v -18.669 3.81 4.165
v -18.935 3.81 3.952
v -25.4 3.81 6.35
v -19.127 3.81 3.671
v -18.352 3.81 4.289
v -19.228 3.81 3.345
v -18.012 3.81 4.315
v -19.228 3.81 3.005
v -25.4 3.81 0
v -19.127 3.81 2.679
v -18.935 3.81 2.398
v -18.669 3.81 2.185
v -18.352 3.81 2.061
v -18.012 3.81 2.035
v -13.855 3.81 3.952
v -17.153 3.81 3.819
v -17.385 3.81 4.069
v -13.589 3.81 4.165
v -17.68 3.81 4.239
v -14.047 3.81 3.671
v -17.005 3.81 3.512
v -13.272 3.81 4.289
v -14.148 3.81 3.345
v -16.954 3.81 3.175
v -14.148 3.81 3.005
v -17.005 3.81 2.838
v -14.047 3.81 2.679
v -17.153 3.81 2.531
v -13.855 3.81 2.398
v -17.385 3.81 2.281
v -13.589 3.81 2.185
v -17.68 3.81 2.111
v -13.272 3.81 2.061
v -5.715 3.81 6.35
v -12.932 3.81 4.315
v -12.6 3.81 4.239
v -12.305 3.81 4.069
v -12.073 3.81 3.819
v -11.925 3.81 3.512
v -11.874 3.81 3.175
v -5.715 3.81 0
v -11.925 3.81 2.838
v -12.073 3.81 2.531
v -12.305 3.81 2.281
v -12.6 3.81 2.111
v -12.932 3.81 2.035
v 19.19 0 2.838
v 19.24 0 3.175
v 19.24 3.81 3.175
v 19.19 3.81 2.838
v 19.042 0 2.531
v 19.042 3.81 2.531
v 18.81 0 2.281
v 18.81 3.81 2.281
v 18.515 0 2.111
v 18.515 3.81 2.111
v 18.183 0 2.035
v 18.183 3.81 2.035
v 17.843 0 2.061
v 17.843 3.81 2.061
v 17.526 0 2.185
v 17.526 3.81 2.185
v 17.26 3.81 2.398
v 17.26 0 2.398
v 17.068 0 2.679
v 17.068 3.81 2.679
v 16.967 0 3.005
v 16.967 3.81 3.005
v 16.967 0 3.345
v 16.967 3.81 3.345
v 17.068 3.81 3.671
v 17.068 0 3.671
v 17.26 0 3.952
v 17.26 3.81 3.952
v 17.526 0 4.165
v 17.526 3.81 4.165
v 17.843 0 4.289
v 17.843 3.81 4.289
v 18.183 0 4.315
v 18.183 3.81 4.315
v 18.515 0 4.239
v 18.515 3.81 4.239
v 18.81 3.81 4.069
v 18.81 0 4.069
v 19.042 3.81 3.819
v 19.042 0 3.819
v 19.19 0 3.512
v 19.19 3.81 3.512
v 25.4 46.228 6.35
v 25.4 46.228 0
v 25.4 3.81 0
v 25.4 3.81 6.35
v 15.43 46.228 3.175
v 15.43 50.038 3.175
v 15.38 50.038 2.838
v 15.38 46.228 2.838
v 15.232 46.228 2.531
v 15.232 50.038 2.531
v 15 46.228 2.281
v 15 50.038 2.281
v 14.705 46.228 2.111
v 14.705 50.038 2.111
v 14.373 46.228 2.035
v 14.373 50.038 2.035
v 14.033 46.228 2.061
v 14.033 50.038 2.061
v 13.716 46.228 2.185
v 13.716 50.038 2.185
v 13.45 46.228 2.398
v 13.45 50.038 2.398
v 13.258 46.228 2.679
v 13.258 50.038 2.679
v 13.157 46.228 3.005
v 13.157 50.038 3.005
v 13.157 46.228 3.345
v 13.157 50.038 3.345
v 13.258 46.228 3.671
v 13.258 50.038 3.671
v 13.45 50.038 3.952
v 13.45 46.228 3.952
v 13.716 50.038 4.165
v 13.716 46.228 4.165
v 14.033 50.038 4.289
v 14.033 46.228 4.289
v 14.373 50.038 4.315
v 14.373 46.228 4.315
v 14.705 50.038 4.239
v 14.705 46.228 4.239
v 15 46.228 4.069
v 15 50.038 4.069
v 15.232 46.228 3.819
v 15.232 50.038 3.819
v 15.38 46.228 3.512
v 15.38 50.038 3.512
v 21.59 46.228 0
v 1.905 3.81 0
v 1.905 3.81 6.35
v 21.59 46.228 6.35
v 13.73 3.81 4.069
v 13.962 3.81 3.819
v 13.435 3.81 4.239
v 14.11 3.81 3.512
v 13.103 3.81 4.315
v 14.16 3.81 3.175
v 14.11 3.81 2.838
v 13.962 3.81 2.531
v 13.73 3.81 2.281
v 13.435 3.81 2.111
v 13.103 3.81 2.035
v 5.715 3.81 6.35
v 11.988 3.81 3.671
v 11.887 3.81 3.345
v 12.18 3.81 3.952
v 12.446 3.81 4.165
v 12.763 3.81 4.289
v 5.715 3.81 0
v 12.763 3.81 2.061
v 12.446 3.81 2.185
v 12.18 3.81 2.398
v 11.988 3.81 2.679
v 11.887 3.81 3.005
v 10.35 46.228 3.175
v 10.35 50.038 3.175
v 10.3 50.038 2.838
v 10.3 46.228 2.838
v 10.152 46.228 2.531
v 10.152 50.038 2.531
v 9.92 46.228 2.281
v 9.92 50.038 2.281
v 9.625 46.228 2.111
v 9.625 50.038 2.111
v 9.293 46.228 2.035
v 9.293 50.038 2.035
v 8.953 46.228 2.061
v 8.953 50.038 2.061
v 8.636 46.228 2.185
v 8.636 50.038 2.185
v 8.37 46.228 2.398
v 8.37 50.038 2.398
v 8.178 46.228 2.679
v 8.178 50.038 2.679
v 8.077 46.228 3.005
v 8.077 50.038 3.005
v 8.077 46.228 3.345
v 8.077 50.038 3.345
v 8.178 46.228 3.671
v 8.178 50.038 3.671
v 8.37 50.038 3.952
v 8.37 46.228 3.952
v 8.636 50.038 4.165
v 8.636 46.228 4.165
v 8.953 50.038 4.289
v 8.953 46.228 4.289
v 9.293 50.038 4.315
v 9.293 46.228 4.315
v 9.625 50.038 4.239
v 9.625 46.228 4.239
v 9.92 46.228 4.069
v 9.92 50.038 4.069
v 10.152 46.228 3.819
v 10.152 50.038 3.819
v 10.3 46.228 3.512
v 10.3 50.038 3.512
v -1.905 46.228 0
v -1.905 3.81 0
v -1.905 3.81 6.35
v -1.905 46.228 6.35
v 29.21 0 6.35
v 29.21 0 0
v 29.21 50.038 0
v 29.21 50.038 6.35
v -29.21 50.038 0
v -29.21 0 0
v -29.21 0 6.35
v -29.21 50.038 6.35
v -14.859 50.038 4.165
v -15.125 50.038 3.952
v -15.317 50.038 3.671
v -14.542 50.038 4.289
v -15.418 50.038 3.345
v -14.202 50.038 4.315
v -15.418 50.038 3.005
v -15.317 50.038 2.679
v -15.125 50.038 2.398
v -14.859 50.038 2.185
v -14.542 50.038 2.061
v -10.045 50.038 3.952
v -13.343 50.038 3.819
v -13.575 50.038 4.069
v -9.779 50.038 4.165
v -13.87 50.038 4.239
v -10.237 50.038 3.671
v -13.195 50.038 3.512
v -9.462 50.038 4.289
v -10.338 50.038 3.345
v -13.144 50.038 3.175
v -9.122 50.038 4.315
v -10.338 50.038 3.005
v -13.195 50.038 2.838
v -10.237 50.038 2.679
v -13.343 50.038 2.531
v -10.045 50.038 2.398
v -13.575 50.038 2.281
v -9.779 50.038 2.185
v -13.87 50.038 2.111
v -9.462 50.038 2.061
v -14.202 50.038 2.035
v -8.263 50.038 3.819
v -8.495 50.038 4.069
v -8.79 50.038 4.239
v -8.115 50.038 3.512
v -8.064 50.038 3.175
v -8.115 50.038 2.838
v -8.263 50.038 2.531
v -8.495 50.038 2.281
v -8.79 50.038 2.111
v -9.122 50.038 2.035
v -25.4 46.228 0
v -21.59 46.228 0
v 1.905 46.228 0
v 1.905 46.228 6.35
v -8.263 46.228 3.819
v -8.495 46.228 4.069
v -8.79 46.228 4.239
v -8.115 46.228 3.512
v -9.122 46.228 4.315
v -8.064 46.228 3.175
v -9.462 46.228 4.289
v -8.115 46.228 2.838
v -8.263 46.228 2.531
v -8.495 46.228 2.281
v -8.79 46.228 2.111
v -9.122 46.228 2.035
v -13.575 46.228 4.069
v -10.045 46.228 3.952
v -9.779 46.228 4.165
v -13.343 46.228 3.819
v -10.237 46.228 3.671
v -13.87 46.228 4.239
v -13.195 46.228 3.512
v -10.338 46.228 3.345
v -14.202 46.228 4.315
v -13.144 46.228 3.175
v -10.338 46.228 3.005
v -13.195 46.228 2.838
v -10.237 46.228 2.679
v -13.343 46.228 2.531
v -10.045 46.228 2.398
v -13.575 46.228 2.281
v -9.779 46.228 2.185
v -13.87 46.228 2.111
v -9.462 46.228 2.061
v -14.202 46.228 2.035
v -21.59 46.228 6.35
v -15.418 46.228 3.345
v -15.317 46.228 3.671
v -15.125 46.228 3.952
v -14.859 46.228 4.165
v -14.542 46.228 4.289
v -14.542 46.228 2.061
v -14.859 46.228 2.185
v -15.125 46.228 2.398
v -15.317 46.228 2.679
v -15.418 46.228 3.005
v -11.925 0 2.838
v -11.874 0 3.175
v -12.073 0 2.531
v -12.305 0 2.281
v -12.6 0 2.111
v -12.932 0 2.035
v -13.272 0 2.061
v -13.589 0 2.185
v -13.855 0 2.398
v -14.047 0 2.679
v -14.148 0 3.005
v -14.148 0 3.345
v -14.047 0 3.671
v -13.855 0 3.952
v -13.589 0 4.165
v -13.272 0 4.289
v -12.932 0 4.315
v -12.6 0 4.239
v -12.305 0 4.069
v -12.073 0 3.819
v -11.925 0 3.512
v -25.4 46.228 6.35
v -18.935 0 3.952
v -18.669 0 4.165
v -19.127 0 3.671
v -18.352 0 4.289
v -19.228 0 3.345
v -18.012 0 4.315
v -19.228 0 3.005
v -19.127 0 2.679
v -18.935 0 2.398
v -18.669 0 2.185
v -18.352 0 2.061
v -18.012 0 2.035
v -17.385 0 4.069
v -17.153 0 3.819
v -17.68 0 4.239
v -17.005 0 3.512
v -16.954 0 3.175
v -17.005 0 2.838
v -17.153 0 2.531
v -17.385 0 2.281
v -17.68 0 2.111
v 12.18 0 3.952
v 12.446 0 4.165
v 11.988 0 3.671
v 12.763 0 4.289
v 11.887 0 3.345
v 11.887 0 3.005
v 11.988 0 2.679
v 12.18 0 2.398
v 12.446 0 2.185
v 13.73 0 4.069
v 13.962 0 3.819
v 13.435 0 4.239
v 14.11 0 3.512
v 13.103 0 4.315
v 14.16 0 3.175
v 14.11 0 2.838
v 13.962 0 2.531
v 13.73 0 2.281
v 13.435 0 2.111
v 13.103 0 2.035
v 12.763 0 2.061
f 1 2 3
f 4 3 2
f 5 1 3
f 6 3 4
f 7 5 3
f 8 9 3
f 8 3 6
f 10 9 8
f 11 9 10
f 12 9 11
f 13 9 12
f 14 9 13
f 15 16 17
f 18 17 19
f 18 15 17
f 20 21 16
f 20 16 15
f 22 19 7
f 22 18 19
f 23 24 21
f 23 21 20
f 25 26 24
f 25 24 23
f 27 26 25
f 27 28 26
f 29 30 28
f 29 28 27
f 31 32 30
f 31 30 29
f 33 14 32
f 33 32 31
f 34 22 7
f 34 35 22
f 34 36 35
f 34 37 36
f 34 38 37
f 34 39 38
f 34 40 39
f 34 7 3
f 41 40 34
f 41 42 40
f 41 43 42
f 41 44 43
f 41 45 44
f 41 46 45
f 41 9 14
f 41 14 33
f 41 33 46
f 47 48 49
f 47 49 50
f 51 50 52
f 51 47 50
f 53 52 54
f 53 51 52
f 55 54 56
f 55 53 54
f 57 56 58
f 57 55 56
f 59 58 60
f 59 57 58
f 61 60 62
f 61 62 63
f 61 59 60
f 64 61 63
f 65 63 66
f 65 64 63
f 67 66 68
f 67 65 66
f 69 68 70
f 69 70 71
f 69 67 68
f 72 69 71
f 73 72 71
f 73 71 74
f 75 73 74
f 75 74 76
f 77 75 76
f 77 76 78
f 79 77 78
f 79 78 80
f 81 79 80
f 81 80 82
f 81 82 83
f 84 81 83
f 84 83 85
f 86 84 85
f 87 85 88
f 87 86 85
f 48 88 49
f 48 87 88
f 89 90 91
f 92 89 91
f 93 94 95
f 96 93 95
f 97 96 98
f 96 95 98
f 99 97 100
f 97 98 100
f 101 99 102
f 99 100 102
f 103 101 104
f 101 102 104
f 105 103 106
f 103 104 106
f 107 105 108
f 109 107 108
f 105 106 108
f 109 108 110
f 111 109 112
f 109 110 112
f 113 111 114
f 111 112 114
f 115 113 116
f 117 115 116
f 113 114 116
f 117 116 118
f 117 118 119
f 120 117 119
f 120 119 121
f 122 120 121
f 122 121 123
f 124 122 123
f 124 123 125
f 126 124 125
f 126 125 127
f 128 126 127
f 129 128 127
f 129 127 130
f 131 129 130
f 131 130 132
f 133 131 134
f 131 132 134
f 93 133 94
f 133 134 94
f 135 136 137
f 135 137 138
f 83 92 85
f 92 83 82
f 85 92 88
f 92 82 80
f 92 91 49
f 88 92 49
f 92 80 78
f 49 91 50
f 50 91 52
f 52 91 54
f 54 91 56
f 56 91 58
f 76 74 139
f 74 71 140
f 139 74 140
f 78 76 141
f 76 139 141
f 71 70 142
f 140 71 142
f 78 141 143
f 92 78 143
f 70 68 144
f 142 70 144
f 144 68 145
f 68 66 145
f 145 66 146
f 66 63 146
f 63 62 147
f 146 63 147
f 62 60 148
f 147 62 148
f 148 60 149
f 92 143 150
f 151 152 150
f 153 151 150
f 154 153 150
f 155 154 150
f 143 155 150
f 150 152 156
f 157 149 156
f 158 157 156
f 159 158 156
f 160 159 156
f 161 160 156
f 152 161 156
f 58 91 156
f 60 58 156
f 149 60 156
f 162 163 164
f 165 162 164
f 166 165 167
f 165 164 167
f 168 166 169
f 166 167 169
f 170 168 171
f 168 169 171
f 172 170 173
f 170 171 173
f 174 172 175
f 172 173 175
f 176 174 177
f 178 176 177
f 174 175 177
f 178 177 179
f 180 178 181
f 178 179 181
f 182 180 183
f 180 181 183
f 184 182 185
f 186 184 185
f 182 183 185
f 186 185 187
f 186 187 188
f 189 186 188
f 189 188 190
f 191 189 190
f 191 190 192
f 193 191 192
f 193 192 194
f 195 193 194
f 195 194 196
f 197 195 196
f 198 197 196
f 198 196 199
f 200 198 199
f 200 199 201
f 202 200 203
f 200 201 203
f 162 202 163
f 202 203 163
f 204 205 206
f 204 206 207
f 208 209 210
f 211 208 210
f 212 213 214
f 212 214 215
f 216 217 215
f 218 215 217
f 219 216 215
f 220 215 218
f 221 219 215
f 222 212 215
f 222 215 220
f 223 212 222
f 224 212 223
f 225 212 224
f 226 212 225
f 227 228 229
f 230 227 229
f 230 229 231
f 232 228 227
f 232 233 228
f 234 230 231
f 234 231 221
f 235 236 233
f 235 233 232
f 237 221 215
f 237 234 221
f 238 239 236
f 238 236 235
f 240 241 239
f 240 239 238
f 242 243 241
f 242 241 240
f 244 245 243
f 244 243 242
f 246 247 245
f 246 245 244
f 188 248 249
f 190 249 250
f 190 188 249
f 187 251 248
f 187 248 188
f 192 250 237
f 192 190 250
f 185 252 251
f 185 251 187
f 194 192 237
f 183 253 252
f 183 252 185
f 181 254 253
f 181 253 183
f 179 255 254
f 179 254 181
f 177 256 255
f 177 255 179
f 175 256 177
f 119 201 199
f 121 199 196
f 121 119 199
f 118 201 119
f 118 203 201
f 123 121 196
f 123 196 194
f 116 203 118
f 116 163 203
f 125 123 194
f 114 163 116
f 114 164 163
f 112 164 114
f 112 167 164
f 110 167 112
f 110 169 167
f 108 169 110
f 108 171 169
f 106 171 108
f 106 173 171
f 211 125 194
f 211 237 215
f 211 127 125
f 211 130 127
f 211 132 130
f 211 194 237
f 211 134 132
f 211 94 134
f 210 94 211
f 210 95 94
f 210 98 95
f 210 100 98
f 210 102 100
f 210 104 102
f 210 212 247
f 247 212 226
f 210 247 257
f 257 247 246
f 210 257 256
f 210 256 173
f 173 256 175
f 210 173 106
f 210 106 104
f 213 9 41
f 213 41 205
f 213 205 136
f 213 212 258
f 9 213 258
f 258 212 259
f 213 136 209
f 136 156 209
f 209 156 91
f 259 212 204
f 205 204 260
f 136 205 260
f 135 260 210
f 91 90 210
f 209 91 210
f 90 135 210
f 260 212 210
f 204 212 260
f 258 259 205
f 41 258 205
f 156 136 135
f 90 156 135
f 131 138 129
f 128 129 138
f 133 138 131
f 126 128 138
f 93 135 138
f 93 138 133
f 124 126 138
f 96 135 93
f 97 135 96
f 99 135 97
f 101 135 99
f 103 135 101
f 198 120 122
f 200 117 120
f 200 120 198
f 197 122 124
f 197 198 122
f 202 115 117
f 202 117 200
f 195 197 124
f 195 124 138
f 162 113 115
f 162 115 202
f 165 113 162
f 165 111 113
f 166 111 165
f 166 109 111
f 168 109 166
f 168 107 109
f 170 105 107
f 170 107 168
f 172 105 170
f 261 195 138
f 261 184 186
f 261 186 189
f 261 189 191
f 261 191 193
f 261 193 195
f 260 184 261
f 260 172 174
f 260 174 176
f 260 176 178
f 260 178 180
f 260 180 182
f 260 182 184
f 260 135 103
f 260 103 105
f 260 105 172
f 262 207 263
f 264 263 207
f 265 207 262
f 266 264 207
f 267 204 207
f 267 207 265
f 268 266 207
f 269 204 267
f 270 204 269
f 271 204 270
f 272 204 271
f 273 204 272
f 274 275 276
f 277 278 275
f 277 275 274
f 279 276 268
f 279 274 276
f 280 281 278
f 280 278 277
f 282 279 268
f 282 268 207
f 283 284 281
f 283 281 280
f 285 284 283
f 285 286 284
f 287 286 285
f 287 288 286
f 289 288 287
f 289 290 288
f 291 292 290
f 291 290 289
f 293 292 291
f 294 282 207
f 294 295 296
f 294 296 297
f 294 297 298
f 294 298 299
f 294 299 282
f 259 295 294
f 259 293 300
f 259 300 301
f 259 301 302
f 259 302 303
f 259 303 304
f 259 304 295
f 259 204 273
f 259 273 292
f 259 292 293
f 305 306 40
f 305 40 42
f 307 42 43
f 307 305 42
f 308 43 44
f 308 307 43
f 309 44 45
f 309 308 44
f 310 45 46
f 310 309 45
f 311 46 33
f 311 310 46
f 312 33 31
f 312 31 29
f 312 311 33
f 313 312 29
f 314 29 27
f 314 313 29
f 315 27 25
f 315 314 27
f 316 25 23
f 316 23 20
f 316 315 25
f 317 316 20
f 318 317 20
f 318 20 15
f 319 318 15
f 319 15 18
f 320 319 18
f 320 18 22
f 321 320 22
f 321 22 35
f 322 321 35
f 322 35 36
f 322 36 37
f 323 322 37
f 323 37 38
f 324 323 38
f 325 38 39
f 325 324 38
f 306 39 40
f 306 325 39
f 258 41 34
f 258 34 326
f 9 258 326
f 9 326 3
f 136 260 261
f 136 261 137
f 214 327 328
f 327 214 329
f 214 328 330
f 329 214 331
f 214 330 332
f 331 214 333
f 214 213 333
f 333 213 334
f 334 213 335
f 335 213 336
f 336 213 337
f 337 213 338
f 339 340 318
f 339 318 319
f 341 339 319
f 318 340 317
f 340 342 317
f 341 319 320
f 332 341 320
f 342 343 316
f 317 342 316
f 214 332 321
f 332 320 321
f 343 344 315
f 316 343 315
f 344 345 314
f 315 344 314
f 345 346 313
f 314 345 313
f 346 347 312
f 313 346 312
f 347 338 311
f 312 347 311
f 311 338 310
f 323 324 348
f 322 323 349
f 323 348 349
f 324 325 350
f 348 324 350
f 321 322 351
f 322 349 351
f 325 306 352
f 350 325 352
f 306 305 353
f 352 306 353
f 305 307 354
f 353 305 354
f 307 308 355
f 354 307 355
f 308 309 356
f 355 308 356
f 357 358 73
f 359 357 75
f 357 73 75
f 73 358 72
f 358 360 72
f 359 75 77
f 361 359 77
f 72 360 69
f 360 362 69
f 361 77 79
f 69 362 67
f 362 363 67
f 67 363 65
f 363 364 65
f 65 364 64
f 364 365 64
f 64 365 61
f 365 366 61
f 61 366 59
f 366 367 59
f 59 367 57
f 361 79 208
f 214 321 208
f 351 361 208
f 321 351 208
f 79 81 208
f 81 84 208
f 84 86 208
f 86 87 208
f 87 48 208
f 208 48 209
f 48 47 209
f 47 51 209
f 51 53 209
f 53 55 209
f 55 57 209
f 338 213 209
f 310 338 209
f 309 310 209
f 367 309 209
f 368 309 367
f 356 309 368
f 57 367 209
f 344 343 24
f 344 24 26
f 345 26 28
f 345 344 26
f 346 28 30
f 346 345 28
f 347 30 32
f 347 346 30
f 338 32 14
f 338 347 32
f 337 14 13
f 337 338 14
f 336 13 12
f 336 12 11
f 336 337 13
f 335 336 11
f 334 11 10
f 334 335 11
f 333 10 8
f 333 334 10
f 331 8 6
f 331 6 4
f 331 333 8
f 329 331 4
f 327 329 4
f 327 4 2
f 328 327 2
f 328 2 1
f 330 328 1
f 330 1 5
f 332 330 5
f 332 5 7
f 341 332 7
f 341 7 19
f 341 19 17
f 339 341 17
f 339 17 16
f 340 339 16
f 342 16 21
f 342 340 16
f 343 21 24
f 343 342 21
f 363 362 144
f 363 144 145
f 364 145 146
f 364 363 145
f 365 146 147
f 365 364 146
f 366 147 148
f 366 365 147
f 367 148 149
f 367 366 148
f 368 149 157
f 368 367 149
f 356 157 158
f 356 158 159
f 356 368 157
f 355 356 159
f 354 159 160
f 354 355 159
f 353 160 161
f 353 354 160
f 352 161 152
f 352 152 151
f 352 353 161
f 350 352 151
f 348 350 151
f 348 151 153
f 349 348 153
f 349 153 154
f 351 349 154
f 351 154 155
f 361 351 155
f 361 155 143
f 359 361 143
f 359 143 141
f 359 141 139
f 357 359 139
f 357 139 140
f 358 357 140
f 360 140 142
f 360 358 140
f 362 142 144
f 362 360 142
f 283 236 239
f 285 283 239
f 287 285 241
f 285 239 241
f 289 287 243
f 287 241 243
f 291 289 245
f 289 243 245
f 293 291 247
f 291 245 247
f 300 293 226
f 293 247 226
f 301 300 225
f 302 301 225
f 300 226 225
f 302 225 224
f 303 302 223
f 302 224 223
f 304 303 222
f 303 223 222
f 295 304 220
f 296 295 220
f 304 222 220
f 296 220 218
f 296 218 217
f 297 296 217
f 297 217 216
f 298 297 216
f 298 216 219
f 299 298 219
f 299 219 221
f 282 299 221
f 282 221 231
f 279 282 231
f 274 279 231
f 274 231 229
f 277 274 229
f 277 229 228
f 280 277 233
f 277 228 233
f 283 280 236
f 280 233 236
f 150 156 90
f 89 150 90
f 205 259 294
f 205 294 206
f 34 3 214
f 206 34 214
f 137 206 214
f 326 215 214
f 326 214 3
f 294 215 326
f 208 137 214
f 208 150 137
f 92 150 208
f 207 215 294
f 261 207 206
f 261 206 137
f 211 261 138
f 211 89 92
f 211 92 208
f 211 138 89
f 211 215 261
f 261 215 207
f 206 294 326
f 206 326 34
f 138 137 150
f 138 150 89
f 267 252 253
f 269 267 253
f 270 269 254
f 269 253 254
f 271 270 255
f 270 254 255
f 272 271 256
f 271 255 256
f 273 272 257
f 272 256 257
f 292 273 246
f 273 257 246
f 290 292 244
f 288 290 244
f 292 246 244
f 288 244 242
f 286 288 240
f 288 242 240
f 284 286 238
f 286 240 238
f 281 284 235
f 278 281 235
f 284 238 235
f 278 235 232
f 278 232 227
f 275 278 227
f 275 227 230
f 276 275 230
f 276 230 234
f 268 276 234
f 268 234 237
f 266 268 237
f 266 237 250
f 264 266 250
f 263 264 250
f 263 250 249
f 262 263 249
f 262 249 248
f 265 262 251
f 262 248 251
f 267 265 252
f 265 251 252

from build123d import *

# Parameters (mm, degrees)
SKETCH1_W           = 58.42
SKETCH1_H           = 50.038
BOSS_EXTRUDE1_DEPTH = 6.35
SKETCH2_R           = 1.143
CUT_EXTRUDE1_DEPTH  = 3.81
SKETCH3_R           = 1.143
CUT_EXTRUDE2_DEPTH  = 3.81


with BuildPart() as part:
    # Sketch1 → Boss-Extrude1 (new body)
    with BuildSketch(Plane.XY):
        with Locations((0, 25.019)):
            Rectangle(SKETCH1_W, SKETCH1_H)
        Polygon((-25.4, 46.228), (-25.4, 3.81), (-5.715, 3.81), align=None, mode=Mode.SUBTRACT)
        Polygon((1.905, 46.228), (1.905, 3.81), (21.59, 46.228), align=None, mode=Mode.SUBTRACT)
        Polygon((-21.59, 46.228), (-1.905, 3.81), (-1.905, 46.228), align=None, mode=Mode.SUBTRACT)
        Polygon((5.715, 3.81), (25.4, 46.228), (25.4, 3.81), align=None, mode=Mode.SUBTRACT)
    extrude(amount=BOSS_EXTRUDE1_DEPTH)

    # Sketch2 → Cut-Extrude1 (cut)
    with BuildSketch(Plane(origin=(0, 0, 0), x_dir=(1, 0, 0), z_dir=(0, 1, 0))):
        with Locations((-18.0975, -3.175)):
            Circle(SKETCH2_R)
        with Locations((-13.0175, -3.175)):
            Circle(SKETCH2_R)
        with Locations((18.0975, -3.175)):
            Circle(SKETCH2_R)
        with Locations((13.0175, -3.175)):
            Circle(SKETCH2_R)
    extrude(amount=CUT_EXTRUDE1_DEPTH, mode=Mode.SUBTRACT)

    # Sketch3 → Cut-Extrude2 (cut)
    with BuildSketch(Plane(origin=(0, 50.038, 0), x_dir=(1, 0, 0), z_dir=(0, 1, 0))):
        with Locations((-14.2875, -3.175)):
            Circle(SKETCH3_R)
        with Locations((-9.2075, -3.175)):
            Circle(SKETCH3_R)
        with Locations((9.2075, -3.175)):
            Circle(SKETCH3_R)
        with Locations((14.2875, -3.175)):
            Circle(SKETCH3_R)
    extrude(amount=-CUT_EXTRUDE2_DEPTH, mode=Mode.SUBTRACT)


solid = part.part
